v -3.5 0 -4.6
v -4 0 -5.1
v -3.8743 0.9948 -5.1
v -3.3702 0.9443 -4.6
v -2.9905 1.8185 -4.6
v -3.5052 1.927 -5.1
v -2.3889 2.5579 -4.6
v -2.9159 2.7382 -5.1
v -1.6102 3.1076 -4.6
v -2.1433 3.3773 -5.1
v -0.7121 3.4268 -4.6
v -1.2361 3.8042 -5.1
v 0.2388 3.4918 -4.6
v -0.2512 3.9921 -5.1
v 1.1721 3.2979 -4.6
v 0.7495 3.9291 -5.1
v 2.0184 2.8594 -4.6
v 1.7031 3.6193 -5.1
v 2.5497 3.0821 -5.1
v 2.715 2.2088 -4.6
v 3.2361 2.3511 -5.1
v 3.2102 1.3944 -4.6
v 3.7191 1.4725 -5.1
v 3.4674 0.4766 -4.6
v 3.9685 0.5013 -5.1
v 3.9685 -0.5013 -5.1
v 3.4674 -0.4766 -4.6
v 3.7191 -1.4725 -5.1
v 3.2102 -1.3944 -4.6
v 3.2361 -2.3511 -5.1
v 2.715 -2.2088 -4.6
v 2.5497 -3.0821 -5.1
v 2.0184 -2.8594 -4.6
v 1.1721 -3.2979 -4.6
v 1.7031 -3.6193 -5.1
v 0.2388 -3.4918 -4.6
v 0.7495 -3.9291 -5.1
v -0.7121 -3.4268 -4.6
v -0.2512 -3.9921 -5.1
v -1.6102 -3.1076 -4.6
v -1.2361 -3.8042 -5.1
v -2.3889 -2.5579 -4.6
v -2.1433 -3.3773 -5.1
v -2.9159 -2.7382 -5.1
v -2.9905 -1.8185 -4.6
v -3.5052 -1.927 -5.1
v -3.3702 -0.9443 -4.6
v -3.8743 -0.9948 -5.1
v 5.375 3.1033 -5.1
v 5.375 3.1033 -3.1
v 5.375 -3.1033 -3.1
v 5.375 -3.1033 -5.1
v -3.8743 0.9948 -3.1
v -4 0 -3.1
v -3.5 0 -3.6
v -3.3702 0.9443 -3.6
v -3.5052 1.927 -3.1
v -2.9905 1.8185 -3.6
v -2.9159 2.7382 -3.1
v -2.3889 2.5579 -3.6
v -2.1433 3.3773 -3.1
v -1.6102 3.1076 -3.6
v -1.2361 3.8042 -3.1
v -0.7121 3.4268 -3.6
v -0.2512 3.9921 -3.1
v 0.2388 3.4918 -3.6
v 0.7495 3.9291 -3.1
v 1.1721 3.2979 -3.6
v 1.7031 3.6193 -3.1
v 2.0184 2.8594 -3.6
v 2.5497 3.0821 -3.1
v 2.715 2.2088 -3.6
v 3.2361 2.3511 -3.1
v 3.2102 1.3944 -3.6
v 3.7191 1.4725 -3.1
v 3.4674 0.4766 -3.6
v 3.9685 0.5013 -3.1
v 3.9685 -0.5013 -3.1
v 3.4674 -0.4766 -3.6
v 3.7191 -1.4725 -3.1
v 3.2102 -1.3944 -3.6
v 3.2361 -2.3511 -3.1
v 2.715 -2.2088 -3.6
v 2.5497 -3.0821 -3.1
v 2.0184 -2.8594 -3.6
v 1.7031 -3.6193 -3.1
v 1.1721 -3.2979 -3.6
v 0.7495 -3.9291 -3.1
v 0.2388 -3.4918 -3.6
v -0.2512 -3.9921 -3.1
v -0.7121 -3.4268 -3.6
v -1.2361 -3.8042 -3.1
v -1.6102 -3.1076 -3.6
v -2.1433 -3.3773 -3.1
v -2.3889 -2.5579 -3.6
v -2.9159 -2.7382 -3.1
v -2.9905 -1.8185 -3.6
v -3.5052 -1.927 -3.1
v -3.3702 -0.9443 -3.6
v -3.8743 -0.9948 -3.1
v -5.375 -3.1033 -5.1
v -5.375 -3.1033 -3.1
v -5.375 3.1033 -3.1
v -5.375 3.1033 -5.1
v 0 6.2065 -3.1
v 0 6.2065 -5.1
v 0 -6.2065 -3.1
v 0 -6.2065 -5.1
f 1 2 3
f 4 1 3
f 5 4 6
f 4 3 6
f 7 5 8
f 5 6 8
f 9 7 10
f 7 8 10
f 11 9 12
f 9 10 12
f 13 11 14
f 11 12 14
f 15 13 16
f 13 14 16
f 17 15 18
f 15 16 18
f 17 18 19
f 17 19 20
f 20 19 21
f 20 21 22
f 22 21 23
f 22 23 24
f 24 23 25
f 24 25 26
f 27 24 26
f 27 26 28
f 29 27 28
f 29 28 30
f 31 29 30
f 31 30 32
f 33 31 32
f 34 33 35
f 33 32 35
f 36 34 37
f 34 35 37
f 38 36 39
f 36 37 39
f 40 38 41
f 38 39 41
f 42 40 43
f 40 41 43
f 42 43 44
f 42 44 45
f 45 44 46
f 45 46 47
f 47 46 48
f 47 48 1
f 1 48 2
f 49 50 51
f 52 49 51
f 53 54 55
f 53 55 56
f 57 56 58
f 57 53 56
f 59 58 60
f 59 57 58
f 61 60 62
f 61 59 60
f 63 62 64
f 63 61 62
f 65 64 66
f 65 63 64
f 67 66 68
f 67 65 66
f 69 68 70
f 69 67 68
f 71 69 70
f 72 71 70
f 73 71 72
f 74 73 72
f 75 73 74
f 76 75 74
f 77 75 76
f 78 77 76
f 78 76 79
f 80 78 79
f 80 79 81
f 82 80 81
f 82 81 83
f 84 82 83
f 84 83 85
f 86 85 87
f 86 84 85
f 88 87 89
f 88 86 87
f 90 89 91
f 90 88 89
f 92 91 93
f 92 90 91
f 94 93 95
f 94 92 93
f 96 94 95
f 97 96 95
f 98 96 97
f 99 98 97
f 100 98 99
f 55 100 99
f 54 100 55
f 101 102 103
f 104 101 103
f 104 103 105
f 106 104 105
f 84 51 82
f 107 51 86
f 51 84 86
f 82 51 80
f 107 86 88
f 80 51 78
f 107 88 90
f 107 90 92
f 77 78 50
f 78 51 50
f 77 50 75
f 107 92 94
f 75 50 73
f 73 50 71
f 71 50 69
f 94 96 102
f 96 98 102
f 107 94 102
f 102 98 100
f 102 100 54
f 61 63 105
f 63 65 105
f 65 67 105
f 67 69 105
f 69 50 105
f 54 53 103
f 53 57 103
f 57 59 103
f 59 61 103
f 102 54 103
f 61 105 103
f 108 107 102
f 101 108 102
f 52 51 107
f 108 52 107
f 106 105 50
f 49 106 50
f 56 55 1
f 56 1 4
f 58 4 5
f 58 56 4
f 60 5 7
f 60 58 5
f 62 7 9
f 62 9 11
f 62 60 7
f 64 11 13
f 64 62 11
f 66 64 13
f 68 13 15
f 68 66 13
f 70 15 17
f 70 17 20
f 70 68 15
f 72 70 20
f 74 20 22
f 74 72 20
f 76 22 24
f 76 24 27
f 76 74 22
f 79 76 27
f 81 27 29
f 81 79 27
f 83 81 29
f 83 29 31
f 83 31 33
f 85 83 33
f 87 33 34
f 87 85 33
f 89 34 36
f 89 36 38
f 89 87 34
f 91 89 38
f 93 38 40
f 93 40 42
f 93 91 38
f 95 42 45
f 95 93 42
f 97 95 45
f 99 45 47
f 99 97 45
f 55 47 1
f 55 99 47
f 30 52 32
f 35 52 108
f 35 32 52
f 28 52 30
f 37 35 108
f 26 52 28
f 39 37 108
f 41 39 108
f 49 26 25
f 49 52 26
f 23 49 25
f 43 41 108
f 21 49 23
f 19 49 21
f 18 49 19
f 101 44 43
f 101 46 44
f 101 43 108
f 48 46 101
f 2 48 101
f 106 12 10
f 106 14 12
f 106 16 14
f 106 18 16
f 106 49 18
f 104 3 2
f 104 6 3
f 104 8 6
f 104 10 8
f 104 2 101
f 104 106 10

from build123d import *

# Parameters (mm, degrees)
SKETCH019_R             = 3.5
PAD011_DEPTH            = 2
CHAMFER004_SIZE         = 0.5
CHAMFER005_SIZE         = 0.5
BODY007_PITCH_ANGLE     = 90
BODY007_PLACEMENT_ANGLE = 90


with BuildPart() as part:
    # Sketch019 → Pad011 (new body)
    with BuildSketch(Plane.YZ):
        Polygon((5.375, -3.103258), (5.375, 3.103258), (0, 6.206515), (-5.375, 3.103258), (-5.375, -3.103258), (0, -6.206515), align=None)
        Circle(SKETCH019_R, mode=Mode.SUBTRACT)
    extrude(amount=PAD011_DEPTH)

    # Chamfer004
    chamfer004_edges = [part.edges().sort_by_distance(p)[0] for p in [
        (0, -3.5, 0),
    ]]
    chamfer(chamfer004_edges, length=CHAMFER004_SIZE)

    # Chamfer005
    chamfer005_edges = [part.edges().sort_by_distance(p)[0] for p in [
        (2, -3.5, 0),
    ]]
    chamfer(chamfer005_edges, length=CHAMFER005_SIZE)


with BuildPart() as part_1:
    # Body007 pitch: moved
    add(part.part.rotate(Axis((0, 0, 0), (0, 1, 0)), BODY007_PITCH_ANGLE))


with BuildPart() as part_2:
    # Body007 placement: moved
    add(part_1.part.moved(Location((0, 0, -3.1))).rotate(Axis((0, 0, -3.1), (0, 0, 1)), BODY007_PLACEMENT_ANGLE))


solid = part_2.part
